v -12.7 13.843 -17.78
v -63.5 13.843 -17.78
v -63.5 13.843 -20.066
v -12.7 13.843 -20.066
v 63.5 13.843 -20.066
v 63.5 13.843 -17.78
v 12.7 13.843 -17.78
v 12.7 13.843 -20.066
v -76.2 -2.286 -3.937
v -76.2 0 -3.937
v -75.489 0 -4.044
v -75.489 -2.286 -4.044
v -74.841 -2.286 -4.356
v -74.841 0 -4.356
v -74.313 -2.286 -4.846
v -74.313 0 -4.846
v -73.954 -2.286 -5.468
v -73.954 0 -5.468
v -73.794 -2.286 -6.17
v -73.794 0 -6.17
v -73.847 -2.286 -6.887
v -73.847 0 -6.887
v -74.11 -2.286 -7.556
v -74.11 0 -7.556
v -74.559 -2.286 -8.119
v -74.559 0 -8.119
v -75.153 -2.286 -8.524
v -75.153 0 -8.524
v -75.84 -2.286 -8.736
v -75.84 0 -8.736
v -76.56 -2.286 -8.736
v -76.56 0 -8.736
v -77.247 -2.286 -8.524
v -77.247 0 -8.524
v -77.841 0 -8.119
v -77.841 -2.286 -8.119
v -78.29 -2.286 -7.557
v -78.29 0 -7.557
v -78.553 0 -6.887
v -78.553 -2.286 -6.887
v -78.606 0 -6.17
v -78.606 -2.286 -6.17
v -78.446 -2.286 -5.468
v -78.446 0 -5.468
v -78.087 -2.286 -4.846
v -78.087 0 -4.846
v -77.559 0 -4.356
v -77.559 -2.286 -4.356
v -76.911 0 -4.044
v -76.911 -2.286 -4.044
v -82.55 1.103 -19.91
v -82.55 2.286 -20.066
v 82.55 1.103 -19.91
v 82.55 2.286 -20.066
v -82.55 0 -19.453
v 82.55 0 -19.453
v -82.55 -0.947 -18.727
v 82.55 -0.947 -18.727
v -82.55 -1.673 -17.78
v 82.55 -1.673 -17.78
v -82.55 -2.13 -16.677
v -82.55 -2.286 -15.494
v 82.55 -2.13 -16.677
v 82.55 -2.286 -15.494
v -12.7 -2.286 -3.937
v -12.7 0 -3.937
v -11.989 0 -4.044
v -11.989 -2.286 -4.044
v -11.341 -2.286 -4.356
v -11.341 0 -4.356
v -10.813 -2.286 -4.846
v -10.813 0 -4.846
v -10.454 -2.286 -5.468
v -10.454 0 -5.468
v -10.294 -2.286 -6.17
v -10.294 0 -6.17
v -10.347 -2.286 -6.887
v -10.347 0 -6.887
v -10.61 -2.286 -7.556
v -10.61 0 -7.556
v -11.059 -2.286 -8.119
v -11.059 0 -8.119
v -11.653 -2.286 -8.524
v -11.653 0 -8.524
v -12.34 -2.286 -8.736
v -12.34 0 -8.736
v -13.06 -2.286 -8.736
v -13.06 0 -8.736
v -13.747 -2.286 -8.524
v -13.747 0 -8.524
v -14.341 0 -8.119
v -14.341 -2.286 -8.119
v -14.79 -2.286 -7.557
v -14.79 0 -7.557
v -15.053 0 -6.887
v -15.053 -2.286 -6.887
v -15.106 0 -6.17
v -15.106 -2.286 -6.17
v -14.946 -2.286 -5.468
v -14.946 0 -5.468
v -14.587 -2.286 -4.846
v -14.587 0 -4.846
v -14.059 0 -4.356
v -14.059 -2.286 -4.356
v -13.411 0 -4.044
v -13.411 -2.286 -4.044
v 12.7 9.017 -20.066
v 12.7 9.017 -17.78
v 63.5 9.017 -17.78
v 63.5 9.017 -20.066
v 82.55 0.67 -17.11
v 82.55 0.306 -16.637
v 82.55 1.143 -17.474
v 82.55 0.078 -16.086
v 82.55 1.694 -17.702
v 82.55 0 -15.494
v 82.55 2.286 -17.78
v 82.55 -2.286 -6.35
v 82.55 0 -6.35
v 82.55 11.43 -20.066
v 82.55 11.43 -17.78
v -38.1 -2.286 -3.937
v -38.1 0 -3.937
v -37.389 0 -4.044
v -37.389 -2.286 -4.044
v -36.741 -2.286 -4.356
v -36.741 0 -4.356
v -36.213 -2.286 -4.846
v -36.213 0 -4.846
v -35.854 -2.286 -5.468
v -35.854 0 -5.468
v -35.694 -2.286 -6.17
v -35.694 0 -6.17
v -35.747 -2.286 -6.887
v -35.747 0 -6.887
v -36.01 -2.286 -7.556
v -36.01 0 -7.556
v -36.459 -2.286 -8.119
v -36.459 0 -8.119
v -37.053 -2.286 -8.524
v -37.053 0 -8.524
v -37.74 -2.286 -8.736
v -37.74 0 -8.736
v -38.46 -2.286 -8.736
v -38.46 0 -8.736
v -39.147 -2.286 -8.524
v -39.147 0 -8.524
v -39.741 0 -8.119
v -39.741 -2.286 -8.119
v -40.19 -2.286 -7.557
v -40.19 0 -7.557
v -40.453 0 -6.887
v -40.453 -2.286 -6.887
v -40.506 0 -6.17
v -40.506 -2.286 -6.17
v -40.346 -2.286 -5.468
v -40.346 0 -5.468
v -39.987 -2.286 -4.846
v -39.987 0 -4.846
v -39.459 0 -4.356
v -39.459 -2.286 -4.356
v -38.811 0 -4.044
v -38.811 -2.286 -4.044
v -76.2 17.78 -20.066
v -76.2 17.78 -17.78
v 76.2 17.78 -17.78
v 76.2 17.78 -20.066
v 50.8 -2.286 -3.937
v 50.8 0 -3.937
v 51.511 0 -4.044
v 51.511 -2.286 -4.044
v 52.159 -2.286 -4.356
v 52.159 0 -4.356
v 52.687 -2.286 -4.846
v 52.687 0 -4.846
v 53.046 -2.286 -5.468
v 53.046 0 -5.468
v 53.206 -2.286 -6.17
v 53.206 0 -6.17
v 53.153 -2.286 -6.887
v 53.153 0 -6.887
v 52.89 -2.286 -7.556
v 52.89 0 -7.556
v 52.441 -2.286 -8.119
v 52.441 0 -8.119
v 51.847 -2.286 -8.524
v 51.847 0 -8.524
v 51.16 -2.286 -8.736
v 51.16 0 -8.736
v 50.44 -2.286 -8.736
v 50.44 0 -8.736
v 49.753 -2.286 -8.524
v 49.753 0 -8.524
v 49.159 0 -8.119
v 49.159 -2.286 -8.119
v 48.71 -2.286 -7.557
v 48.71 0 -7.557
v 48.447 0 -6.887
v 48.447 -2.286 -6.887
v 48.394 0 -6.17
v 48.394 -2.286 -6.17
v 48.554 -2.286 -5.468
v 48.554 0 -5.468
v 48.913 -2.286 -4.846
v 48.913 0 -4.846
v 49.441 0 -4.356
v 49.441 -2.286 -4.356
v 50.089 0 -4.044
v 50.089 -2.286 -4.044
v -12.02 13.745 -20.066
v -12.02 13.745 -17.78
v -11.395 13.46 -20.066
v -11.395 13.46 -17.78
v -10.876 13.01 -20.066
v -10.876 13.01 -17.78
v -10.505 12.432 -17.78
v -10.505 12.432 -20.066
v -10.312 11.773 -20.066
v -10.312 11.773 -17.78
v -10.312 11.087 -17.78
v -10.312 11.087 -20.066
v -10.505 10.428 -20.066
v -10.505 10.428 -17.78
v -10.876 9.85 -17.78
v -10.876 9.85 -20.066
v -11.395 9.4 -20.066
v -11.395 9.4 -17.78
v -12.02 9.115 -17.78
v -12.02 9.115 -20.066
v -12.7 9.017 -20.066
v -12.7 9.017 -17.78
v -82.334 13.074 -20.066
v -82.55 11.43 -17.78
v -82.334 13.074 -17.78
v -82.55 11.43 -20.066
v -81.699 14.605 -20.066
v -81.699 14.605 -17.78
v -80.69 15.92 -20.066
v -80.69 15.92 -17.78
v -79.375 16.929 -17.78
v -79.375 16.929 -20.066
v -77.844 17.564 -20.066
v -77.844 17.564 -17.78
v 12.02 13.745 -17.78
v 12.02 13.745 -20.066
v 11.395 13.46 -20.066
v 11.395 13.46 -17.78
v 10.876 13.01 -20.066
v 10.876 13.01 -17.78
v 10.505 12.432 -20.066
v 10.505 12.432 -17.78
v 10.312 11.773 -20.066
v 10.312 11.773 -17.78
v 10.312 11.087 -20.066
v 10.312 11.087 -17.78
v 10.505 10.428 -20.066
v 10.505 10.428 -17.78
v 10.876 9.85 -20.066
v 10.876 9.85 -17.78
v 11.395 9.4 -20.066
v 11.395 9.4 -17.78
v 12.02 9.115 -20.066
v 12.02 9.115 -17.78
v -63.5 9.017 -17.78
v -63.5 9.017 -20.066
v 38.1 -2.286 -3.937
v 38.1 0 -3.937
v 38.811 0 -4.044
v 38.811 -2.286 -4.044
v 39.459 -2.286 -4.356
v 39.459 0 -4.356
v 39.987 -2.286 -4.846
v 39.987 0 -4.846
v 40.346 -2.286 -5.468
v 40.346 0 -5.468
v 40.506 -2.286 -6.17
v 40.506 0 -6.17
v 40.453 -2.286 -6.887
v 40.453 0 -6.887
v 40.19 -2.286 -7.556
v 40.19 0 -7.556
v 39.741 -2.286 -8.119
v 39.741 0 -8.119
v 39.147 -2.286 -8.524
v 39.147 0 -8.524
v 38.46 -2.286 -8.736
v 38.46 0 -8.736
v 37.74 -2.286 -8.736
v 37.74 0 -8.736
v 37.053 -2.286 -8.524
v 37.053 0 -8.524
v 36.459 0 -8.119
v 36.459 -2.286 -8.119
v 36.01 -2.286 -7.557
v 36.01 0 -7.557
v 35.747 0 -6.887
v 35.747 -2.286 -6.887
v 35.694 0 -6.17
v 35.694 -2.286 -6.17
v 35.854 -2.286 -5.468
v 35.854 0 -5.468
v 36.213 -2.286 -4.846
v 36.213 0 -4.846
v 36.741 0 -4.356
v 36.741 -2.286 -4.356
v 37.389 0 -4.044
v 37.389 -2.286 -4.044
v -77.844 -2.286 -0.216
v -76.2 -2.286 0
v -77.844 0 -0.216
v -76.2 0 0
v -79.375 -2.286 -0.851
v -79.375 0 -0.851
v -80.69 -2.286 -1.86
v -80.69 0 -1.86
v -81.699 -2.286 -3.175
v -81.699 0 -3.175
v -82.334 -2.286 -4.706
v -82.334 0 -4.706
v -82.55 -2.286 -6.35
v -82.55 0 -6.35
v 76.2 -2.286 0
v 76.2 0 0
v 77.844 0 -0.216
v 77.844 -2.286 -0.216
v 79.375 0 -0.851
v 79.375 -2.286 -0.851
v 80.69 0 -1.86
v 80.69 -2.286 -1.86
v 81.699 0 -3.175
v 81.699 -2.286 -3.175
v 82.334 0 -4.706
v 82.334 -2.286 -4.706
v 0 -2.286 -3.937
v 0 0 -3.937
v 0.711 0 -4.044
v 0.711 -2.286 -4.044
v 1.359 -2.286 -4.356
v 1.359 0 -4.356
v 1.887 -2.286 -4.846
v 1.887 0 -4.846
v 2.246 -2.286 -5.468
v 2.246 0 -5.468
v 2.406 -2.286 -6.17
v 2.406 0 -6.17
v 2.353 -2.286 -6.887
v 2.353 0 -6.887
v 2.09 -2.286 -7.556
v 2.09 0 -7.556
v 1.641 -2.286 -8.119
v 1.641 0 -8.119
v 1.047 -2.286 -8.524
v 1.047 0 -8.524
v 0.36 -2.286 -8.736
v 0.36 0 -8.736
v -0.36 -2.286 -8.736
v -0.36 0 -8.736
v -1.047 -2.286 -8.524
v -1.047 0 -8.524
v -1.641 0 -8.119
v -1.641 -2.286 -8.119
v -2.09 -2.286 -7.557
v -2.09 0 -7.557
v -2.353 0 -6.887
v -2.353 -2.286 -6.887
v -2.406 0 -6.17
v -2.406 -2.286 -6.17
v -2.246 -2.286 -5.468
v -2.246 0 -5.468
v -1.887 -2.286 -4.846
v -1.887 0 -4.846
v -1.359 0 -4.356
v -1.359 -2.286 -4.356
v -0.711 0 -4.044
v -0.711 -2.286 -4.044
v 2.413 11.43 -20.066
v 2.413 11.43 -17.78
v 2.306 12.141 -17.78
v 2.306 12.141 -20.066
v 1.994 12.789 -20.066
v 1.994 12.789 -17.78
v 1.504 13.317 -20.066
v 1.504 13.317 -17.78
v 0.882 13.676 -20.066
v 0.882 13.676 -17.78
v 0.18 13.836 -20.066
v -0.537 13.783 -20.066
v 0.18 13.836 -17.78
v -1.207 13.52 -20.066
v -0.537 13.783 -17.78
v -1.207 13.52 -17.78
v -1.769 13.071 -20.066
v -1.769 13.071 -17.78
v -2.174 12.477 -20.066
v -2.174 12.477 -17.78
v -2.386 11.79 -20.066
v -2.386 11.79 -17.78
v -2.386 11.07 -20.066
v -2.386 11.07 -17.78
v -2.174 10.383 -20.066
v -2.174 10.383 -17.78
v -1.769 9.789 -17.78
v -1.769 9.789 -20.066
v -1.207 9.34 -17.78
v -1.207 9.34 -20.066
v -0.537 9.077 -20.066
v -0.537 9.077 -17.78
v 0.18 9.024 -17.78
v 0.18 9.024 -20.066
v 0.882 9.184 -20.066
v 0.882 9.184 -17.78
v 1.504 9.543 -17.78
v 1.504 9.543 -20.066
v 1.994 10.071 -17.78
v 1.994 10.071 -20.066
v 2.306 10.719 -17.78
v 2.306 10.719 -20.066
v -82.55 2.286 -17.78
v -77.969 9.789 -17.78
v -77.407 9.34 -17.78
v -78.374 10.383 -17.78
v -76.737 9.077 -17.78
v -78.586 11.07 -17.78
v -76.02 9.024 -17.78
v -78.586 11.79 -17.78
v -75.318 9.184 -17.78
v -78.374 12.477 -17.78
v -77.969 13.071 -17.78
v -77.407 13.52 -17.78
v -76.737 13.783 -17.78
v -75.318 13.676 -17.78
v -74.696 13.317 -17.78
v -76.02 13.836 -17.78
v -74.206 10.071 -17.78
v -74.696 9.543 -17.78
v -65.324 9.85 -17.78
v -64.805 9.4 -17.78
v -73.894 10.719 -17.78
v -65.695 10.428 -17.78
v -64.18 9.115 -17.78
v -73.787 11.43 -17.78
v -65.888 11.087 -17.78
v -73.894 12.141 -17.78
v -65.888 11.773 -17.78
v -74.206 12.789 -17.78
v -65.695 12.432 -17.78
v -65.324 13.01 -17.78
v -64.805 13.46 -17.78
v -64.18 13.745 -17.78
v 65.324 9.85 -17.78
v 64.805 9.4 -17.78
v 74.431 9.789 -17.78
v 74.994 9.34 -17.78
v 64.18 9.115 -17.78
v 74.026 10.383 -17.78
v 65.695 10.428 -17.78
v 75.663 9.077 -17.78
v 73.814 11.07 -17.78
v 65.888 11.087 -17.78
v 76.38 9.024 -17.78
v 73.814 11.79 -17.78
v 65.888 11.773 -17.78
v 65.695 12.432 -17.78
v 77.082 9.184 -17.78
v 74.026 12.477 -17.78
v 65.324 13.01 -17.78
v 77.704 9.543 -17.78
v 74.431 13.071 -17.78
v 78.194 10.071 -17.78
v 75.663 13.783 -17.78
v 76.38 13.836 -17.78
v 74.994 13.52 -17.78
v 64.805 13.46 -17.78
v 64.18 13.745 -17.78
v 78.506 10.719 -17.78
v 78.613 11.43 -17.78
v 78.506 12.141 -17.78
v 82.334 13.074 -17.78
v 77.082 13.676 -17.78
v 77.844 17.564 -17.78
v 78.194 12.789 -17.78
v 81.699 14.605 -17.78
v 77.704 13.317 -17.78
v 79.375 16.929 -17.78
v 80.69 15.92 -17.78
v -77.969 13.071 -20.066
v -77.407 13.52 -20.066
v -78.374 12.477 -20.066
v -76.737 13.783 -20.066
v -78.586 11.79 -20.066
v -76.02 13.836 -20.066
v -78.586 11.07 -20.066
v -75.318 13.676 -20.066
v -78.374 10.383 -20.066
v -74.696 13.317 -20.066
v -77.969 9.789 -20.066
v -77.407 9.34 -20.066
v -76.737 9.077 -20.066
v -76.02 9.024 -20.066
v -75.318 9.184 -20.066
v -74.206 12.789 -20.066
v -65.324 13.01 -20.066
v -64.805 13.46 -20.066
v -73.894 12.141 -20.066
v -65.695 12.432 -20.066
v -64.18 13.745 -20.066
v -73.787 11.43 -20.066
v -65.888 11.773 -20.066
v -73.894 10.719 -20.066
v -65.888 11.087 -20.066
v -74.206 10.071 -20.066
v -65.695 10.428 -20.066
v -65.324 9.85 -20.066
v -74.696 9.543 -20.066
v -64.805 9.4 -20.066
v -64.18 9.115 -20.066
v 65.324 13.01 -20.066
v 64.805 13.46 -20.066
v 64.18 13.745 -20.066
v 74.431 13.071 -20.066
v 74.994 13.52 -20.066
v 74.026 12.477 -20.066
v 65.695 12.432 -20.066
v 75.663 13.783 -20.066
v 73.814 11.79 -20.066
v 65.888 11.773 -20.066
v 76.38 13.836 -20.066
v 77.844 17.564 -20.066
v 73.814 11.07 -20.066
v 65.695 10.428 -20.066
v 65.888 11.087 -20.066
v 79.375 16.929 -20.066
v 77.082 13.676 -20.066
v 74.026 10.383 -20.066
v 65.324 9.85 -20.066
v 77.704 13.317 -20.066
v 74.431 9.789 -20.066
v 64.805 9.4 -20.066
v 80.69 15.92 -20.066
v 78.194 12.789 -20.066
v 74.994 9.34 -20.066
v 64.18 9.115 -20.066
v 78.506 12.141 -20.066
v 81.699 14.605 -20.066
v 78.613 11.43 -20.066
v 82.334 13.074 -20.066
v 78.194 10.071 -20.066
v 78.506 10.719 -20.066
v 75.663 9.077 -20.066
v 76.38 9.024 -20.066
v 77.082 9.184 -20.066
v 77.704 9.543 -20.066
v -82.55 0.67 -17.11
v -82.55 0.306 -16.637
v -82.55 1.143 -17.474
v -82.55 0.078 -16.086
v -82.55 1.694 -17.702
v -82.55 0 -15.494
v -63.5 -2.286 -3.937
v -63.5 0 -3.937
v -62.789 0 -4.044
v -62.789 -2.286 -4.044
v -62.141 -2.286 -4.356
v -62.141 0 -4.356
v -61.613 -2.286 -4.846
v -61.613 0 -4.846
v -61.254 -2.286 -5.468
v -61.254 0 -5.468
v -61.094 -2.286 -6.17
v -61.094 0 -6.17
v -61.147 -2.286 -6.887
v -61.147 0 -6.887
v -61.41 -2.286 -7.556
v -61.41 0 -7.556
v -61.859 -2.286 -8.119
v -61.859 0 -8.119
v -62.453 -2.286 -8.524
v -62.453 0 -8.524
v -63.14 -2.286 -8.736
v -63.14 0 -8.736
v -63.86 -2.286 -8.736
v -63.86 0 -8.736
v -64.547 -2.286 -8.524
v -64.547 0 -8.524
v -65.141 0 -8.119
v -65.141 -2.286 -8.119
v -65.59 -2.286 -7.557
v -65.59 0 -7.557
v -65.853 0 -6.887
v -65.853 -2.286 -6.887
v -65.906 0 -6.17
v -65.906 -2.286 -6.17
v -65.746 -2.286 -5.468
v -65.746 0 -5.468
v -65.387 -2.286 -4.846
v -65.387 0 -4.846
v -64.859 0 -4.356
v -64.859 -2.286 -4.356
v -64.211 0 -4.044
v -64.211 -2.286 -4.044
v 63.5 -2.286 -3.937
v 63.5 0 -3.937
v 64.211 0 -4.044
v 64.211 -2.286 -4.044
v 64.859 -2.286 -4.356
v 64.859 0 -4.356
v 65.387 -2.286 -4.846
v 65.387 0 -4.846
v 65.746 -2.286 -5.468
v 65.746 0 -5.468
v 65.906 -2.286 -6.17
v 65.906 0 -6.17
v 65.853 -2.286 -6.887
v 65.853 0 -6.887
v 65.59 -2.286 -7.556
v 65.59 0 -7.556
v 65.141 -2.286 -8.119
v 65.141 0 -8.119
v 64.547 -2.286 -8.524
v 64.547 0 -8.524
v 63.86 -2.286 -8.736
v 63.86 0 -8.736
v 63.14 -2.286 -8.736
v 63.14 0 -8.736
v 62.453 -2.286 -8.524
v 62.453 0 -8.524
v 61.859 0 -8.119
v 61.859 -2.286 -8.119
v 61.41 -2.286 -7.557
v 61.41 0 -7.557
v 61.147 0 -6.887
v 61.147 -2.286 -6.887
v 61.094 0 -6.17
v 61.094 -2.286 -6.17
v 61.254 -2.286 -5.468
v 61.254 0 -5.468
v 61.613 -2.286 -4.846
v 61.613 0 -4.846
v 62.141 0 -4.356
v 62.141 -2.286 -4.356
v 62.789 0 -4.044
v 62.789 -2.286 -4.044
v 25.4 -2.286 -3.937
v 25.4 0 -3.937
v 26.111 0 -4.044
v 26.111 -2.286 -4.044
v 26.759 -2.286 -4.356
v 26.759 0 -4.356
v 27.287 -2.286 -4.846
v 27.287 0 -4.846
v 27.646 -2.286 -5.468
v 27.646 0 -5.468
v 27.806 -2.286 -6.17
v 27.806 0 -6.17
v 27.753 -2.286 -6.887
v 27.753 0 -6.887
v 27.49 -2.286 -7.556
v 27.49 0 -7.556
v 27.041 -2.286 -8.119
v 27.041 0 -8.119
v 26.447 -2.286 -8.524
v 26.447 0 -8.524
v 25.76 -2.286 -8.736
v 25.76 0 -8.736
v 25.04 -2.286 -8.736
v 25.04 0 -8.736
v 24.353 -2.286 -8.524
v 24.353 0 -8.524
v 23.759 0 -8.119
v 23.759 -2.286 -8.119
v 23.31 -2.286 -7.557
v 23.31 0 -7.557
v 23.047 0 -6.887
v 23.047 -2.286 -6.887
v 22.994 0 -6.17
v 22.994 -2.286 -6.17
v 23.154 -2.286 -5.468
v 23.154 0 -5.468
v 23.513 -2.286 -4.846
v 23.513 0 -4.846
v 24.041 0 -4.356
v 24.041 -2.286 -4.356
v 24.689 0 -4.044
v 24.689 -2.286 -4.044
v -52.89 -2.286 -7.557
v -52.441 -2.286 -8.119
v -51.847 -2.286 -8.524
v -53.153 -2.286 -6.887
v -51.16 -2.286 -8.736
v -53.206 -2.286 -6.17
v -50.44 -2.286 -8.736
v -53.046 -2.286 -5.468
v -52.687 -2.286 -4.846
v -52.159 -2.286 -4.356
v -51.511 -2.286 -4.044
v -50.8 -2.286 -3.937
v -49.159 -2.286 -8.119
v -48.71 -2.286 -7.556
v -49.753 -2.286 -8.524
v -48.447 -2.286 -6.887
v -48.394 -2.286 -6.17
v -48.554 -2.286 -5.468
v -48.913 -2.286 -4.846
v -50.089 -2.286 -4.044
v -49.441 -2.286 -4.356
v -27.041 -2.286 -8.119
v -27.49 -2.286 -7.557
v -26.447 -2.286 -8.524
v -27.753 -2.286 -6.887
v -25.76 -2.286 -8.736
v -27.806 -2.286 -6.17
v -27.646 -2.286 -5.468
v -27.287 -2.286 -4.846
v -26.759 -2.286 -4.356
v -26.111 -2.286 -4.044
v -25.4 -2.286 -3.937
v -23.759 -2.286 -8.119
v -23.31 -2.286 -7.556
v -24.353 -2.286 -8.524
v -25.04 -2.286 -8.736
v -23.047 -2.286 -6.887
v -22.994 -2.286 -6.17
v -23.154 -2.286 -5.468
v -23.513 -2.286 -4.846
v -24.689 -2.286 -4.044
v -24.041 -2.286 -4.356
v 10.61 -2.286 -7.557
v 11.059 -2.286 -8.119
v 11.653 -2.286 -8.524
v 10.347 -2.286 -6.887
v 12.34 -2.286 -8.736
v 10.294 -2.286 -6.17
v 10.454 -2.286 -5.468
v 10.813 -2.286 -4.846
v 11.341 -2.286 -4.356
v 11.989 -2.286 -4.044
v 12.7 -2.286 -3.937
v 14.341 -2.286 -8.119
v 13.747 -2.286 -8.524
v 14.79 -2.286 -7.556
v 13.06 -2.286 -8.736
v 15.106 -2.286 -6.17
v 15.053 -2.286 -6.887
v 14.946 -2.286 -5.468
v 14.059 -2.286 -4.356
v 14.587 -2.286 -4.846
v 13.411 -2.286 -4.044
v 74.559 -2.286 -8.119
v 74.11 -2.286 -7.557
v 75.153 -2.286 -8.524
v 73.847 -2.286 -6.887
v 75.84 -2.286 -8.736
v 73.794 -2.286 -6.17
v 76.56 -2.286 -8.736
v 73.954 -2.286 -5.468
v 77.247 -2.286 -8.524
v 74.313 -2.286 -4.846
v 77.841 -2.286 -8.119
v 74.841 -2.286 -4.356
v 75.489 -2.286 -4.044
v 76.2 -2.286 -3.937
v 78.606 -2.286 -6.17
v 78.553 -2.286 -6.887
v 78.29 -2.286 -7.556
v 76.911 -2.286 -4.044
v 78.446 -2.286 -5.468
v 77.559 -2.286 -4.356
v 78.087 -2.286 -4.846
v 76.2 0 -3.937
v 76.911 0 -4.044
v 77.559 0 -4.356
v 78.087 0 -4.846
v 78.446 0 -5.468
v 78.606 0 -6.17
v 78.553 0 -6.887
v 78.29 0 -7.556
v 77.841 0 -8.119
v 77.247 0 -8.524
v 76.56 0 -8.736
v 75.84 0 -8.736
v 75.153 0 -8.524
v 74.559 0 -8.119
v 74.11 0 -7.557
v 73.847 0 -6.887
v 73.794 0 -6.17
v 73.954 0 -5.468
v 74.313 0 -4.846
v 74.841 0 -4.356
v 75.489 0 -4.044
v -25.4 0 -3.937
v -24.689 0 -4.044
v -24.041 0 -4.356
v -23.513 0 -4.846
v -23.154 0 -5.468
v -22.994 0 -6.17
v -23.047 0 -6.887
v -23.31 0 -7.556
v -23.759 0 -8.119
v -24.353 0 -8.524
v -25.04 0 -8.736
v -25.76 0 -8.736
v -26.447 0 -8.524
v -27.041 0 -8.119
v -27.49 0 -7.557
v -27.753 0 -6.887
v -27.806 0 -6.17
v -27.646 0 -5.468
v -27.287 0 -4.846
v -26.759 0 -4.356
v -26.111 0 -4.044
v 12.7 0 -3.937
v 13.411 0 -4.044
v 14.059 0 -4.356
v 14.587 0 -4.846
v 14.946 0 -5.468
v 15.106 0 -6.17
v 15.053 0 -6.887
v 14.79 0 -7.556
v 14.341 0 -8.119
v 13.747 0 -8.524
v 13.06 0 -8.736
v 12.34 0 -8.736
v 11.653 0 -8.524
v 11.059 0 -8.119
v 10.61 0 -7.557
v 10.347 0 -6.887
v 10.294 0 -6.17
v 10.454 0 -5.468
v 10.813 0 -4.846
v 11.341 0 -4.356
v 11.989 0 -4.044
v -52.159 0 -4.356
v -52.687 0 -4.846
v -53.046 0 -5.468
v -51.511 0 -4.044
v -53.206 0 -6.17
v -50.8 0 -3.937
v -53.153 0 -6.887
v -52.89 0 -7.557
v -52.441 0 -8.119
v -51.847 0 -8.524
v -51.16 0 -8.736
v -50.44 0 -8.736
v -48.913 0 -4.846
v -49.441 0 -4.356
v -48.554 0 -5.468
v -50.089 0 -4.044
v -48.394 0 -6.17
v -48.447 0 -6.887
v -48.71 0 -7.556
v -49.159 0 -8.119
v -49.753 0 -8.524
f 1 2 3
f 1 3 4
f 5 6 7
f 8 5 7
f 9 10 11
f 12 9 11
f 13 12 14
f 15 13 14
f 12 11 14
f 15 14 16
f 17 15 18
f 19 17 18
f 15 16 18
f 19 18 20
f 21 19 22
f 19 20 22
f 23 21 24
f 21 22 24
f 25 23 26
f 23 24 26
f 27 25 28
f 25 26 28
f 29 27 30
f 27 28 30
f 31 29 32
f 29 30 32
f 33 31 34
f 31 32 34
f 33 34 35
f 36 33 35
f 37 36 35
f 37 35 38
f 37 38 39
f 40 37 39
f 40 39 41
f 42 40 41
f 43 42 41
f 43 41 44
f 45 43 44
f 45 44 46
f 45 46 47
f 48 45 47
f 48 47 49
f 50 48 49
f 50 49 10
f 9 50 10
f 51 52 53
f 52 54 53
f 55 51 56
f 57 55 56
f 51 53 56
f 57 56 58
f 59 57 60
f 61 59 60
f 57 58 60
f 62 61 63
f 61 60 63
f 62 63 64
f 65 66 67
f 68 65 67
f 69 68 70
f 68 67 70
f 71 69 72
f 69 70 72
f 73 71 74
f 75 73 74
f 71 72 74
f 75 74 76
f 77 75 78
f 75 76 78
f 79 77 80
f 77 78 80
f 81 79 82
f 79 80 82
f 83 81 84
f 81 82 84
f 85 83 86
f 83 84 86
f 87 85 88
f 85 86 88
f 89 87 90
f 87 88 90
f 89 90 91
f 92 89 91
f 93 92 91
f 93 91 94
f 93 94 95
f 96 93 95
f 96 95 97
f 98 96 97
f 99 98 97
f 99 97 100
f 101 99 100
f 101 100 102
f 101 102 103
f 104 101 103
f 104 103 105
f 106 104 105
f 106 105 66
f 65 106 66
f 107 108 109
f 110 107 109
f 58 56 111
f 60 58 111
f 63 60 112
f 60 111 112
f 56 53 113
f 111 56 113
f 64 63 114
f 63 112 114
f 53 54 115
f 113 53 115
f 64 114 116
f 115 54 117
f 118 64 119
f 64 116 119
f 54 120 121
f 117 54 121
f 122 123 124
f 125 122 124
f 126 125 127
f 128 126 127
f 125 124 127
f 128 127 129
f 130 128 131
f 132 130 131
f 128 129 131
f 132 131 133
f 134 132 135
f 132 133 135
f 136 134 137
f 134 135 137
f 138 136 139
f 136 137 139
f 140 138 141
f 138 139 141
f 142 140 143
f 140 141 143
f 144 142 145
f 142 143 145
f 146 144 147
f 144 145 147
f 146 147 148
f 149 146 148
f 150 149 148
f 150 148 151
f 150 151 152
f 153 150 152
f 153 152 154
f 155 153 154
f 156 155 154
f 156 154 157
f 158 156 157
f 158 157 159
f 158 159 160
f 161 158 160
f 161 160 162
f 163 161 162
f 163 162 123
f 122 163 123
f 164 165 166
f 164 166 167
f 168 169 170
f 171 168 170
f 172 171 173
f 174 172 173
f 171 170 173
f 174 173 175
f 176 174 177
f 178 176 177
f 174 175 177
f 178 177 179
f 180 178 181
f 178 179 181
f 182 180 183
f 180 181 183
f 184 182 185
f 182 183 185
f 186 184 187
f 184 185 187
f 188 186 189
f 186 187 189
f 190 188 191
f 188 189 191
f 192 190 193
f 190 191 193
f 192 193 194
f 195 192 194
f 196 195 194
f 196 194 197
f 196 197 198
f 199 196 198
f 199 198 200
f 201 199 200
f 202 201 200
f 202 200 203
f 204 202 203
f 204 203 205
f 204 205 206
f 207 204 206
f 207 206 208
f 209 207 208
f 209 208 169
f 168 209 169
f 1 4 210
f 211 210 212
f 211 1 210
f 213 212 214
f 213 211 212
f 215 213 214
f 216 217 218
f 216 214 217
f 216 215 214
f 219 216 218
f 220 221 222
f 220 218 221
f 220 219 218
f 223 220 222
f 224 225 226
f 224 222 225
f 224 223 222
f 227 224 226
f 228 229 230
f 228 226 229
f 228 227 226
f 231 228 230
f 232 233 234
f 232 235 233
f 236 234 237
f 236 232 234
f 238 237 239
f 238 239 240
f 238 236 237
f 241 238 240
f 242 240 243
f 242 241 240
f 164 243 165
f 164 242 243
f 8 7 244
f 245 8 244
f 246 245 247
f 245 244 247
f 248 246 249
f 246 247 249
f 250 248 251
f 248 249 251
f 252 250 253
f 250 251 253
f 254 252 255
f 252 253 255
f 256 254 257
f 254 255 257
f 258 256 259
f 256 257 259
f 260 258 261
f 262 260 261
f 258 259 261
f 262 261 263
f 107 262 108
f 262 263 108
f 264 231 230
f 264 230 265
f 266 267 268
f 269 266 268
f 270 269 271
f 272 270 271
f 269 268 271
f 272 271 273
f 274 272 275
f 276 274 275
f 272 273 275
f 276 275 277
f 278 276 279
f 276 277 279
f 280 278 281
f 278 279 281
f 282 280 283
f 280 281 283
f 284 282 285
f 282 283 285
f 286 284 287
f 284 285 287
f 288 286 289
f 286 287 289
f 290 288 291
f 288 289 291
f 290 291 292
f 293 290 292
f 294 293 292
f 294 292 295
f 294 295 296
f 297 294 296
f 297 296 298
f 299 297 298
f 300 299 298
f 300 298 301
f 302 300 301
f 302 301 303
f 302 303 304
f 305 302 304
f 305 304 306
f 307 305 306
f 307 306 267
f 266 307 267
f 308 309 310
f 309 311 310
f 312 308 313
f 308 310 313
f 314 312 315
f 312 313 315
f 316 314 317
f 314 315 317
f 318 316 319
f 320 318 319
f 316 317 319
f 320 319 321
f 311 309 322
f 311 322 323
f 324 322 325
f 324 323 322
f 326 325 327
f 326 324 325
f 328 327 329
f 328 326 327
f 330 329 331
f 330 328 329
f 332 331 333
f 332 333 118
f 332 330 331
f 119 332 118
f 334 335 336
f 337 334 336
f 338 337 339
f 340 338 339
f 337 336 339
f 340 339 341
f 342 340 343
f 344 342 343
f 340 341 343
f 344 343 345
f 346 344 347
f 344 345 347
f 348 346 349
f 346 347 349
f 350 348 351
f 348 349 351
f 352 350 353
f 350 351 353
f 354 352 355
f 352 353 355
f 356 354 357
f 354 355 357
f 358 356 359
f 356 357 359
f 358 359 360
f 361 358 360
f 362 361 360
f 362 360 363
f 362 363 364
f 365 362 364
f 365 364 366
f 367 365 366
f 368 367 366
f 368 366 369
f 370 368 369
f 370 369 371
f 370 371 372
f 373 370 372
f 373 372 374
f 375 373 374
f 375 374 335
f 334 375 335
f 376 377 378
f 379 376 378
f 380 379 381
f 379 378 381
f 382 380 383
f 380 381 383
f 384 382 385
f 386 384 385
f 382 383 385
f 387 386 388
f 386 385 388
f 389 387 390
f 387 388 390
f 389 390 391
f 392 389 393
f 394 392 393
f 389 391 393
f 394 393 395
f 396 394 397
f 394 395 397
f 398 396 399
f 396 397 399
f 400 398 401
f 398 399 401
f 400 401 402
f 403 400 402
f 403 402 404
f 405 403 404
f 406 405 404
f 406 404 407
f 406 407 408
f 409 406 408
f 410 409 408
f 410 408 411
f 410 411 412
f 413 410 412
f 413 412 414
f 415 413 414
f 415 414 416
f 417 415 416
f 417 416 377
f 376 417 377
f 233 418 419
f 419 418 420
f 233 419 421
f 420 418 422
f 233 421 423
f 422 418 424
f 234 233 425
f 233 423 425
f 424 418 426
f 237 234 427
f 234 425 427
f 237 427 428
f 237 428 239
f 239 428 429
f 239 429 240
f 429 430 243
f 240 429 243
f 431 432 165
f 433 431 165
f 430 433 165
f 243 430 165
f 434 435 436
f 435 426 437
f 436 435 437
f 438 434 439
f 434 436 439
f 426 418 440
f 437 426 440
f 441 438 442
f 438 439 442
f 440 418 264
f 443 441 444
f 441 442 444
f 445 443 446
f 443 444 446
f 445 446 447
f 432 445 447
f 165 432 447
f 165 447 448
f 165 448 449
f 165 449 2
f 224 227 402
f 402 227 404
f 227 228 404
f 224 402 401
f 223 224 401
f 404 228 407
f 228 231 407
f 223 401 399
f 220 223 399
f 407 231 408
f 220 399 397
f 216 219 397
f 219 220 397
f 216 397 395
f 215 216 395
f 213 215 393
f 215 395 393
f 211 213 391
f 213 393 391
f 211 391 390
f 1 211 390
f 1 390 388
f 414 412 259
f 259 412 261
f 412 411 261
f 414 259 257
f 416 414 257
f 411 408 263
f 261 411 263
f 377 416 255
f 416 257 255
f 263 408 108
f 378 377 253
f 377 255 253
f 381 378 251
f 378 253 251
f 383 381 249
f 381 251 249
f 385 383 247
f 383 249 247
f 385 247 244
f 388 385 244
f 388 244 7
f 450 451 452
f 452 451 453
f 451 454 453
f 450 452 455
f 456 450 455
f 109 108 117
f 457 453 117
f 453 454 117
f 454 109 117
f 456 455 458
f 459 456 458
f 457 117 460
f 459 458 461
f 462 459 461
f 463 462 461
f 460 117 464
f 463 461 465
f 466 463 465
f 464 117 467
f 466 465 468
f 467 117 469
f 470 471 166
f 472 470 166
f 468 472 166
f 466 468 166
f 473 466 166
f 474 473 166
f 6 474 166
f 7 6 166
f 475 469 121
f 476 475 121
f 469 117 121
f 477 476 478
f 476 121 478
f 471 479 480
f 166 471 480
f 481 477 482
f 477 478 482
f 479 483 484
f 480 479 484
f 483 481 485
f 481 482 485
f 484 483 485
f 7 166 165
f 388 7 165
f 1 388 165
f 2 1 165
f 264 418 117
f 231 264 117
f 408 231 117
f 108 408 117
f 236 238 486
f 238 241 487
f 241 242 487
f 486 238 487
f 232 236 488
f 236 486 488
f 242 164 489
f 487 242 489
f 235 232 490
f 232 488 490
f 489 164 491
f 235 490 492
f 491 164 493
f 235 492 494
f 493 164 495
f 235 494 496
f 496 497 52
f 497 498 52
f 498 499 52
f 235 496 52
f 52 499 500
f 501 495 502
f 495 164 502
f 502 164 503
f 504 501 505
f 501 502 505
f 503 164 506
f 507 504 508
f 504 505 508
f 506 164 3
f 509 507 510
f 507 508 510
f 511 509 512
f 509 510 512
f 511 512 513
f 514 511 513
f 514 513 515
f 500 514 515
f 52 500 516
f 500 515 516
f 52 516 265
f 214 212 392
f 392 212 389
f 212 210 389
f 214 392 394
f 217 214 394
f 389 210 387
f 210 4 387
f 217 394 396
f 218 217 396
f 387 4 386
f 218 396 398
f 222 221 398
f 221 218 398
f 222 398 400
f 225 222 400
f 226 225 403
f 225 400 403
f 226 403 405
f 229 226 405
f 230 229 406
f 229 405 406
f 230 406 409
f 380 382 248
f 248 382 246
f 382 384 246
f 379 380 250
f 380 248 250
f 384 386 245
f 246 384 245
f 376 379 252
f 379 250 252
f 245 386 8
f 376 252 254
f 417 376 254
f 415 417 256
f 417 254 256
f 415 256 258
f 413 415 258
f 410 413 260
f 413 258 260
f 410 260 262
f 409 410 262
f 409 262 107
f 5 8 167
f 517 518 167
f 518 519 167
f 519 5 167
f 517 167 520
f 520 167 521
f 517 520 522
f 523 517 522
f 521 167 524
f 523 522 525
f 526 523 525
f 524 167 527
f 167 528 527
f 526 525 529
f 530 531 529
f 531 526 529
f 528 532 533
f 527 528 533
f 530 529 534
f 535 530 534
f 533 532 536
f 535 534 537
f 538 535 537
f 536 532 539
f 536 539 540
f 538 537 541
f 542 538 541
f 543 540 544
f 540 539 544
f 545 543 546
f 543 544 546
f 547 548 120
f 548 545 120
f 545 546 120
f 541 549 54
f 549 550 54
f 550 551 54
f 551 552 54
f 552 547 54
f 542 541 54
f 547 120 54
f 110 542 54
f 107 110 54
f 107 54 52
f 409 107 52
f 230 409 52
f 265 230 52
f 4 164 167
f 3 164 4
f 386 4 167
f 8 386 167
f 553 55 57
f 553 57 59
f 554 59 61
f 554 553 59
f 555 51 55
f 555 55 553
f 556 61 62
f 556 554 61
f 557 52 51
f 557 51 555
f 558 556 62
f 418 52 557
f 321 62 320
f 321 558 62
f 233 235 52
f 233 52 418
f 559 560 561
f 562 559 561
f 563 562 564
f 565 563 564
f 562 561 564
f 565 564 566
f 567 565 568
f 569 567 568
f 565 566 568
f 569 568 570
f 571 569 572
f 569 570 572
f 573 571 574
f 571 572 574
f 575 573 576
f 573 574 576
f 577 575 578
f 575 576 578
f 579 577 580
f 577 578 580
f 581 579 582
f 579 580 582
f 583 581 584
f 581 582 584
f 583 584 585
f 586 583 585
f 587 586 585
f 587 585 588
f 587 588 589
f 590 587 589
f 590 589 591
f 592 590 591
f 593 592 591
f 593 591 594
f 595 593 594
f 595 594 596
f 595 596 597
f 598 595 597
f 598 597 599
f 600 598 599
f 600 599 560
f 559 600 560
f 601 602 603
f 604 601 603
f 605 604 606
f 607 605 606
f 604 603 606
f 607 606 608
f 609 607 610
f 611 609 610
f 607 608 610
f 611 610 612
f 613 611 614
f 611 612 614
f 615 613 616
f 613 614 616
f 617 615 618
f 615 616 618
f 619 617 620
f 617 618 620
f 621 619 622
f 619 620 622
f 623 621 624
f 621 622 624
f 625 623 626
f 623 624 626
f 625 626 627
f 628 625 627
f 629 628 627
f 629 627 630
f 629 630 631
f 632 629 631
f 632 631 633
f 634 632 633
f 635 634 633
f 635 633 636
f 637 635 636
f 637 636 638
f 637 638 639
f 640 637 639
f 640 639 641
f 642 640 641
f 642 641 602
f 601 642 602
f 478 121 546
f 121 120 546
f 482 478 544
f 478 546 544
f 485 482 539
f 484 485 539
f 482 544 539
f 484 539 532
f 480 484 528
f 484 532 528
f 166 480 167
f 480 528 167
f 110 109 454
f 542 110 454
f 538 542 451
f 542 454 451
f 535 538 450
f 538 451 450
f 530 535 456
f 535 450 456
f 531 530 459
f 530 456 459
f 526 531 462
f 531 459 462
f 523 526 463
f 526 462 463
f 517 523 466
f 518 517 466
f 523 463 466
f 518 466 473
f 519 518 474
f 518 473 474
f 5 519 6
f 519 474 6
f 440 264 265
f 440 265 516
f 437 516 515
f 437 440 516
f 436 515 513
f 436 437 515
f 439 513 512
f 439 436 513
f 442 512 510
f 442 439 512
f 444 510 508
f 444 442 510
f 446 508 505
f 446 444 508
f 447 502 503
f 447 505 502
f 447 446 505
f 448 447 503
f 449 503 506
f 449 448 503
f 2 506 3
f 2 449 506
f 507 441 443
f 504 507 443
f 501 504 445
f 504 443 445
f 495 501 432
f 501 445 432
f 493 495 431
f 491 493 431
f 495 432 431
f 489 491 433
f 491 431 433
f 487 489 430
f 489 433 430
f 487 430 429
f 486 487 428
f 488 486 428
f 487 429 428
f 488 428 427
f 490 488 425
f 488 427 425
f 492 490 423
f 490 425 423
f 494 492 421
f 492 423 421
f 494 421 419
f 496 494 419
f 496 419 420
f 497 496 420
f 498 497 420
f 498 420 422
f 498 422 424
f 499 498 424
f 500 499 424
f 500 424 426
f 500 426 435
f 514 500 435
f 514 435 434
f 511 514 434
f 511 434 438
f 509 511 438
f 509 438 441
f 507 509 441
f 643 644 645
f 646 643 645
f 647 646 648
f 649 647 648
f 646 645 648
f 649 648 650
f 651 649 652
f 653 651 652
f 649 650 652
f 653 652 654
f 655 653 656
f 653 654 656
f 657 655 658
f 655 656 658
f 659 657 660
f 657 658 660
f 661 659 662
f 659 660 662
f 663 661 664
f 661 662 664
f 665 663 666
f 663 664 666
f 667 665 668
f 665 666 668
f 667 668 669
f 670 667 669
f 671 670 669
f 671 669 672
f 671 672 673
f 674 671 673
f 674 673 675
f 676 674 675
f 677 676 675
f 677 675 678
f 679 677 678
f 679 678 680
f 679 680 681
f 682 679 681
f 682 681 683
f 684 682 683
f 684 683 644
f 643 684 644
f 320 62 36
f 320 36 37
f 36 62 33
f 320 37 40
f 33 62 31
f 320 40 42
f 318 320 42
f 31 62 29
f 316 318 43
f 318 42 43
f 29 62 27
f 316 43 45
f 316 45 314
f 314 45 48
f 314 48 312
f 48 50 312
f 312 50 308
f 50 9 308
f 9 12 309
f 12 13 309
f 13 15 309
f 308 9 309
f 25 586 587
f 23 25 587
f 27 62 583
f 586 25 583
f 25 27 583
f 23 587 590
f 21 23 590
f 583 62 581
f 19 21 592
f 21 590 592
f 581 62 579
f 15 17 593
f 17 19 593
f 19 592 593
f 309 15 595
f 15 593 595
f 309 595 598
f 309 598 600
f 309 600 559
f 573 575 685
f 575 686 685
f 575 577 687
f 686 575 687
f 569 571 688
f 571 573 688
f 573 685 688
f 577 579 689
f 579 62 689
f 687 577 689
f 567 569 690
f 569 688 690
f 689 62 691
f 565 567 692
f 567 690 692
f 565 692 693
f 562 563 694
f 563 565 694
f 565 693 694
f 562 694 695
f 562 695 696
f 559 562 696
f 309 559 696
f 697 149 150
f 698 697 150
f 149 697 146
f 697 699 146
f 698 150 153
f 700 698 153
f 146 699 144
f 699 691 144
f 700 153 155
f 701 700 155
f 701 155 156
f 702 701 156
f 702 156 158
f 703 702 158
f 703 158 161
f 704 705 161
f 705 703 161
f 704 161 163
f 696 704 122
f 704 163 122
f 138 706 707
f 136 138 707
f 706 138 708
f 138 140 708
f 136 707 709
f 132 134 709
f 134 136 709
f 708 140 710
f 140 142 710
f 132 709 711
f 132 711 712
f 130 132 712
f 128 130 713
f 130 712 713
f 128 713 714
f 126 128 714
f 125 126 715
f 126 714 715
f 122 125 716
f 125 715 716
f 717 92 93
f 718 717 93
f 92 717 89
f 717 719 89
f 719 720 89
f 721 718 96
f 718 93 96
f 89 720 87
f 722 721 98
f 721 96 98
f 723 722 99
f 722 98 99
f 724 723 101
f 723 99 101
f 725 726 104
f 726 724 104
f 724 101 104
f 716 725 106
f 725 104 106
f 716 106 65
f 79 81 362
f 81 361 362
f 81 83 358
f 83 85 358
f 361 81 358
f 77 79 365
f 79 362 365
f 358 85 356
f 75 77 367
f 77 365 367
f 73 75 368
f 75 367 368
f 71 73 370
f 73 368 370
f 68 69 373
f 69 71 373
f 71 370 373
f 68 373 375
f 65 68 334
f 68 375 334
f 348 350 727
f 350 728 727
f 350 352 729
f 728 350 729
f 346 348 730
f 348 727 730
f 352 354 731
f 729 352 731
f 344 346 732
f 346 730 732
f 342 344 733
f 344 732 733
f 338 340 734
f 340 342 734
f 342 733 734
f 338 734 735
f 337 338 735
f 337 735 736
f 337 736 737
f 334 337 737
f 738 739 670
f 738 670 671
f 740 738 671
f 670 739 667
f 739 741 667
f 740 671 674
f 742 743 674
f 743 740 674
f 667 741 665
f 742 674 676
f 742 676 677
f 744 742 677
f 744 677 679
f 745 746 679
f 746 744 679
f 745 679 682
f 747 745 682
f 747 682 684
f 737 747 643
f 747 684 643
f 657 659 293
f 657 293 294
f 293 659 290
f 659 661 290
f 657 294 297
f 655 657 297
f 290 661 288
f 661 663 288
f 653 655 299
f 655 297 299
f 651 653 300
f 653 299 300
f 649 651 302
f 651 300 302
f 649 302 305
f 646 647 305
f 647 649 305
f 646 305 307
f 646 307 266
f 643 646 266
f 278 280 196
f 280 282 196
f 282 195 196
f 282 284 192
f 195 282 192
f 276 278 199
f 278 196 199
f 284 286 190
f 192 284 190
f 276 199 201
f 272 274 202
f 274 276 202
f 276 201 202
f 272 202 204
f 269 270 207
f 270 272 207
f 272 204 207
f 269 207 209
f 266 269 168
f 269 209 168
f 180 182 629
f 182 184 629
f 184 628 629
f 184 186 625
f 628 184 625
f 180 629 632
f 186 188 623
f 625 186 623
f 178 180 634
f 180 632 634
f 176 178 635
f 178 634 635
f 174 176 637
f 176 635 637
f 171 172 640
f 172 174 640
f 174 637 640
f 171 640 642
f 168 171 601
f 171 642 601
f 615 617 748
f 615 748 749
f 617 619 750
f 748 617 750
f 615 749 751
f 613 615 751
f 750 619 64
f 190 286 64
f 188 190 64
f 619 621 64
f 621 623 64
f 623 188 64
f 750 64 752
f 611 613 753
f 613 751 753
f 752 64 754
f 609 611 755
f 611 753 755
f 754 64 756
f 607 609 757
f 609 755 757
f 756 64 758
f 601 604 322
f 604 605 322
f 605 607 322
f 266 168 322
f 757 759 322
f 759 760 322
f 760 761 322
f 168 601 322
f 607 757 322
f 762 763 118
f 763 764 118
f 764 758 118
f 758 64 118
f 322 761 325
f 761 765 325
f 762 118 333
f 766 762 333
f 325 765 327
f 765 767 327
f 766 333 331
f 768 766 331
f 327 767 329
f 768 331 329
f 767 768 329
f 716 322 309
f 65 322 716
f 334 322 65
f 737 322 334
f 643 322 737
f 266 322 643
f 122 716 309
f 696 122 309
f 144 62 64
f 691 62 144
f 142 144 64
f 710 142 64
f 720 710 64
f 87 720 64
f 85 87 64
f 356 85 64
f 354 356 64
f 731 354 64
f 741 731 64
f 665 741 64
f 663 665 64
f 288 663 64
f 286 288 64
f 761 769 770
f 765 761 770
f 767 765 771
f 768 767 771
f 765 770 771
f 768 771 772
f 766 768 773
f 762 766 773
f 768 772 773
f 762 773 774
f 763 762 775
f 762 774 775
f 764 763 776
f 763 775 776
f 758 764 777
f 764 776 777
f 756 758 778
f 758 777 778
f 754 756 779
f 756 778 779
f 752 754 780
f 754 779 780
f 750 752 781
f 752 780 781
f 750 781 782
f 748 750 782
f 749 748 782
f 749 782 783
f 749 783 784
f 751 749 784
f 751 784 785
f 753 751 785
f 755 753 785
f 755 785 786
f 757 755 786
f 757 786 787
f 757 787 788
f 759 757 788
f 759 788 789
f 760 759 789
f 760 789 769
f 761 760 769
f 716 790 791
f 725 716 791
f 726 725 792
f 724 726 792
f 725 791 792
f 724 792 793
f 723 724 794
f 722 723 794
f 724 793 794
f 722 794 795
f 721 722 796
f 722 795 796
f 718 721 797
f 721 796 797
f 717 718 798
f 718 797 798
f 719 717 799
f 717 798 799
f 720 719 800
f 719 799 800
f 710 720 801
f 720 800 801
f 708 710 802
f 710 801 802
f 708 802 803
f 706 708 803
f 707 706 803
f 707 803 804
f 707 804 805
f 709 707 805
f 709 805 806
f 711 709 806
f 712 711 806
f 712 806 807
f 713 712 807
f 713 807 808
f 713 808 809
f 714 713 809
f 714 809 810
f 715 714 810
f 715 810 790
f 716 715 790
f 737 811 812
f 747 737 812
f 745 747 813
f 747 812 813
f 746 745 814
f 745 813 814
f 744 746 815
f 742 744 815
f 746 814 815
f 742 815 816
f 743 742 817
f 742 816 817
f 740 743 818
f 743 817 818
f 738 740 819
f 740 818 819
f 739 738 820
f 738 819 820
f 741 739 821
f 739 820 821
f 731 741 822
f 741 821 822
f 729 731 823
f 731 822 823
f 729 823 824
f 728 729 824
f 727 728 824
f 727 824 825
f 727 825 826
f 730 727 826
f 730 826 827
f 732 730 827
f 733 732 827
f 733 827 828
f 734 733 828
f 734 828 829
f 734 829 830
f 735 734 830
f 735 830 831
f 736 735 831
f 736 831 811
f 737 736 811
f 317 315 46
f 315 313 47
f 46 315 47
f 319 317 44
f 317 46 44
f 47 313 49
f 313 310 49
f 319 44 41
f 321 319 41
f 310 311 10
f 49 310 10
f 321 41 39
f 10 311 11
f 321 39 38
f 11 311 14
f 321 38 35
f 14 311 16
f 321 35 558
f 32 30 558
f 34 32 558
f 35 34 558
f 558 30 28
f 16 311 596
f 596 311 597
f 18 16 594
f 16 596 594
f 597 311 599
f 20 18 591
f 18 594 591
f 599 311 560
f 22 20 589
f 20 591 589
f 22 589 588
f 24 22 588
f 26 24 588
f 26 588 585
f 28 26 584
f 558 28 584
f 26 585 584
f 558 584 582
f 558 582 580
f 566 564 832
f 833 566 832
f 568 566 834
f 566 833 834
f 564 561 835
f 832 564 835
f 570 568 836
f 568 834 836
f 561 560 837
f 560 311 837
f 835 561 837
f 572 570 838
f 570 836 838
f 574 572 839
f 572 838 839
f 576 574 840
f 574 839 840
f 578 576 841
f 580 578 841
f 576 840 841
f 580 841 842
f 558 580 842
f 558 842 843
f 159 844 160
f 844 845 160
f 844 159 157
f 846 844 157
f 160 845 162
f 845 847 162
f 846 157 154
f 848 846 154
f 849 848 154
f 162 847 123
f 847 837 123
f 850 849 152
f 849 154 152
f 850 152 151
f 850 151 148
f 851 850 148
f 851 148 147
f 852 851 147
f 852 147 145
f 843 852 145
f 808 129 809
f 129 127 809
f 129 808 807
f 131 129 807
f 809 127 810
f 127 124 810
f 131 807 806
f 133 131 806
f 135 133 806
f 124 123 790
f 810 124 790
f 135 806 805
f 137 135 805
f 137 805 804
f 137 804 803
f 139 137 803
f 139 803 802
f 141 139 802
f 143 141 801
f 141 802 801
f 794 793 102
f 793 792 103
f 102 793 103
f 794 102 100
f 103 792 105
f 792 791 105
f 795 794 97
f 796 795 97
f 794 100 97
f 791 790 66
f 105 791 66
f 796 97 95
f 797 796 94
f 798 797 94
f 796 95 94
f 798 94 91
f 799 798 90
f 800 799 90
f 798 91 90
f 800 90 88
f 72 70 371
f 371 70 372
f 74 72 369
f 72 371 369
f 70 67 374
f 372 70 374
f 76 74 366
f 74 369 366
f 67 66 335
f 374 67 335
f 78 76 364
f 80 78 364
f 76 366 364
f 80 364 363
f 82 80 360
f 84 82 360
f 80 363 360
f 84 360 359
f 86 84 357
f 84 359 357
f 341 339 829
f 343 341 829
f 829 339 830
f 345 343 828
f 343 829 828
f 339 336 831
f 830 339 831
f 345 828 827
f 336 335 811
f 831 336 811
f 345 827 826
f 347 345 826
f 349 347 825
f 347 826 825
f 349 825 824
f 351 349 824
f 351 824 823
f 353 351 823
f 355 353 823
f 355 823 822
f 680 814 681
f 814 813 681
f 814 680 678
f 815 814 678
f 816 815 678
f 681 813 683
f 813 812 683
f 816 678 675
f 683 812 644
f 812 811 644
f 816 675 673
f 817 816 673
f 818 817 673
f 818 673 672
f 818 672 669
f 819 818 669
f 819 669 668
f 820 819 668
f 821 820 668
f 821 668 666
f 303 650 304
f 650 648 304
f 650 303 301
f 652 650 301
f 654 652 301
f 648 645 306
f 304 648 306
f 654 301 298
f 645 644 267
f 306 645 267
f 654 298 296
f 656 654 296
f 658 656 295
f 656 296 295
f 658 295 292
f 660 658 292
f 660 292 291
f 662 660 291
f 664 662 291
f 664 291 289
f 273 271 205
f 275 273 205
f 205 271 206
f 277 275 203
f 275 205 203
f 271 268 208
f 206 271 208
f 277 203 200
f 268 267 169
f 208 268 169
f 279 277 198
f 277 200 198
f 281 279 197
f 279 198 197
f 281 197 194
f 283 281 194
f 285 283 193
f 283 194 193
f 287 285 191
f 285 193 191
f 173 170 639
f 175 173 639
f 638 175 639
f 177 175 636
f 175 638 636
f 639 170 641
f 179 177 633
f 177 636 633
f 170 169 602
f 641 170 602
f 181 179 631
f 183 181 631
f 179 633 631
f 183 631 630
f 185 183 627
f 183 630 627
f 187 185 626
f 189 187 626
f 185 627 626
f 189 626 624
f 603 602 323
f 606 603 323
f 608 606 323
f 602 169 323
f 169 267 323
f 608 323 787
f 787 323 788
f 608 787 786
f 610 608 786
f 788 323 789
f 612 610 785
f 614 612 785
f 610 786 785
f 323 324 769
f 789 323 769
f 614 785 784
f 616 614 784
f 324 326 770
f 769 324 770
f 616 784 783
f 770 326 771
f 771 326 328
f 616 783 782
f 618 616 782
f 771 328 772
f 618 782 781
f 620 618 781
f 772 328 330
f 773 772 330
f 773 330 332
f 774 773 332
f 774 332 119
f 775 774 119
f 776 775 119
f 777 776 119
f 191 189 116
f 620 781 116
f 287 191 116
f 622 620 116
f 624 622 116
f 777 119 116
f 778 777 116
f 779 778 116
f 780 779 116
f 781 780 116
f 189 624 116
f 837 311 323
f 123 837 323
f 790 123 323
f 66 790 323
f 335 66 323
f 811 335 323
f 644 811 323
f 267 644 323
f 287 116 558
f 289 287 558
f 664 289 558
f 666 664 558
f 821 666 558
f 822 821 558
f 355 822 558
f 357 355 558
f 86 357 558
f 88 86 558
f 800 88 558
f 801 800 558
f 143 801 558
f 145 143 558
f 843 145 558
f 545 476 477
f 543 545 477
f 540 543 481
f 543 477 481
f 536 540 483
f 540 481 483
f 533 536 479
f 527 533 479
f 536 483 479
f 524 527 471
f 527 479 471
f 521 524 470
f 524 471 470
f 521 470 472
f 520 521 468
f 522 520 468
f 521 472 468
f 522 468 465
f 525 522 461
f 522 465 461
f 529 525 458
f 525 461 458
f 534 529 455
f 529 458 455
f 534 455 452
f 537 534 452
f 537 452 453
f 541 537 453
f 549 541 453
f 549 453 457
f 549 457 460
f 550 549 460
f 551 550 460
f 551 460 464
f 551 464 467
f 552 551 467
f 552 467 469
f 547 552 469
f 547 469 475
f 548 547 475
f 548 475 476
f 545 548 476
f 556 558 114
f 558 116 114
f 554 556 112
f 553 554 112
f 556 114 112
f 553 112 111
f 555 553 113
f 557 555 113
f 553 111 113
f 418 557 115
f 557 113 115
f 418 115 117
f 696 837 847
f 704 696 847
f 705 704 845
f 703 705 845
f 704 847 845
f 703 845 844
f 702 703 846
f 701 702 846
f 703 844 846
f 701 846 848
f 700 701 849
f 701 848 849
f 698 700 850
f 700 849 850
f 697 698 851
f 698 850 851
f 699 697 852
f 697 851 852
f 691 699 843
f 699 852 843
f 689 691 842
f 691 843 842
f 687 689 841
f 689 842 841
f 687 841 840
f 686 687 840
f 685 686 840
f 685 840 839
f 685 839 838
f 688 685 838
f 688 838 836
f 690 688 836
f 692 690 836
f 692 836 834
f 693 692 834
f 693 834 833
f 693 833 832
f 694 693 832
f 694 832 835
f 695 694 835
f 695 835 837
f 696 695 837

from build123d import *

# Parameters (mm, degrees)
EXTRUDE_THIN1_DEPTH = 82.55
SKETCH2_R           = 2.413
EXTRUDE2_DEPTH      = 87.794442541
LPATTERN1_COUNT     = 13
LPATTERN1_PITCH     = 12.7
FILLET1_R           = 6.35
SKETCH3_R           = 2.413
EXTRUDE3_DEPTH      = 87.294607595
LPATTERN2_COUNT     = 13
LPATTERN2_PITCH     = 76.2
EXTRUDE4_DEPTH      = 87.294607595


with BuildPart() as part:
    # Sketch1 → Extrude-Thin1 (new, symmetric)
    with BuildSketch(Plane(origin=(0, 0, 0), x_dir=(0, 0, -1), z_dir=(1, 0, 0))):
        with BuildLine():
            Line((0, 0), (15.494, 0))
            ThreePointArc((15.494, 0), (17.110446102, 0.669553898), (17.78, 2.286))
            Line((17.78, 2.286), (17.78, 17.78))
            Line((17.78, 17.78), (20.066, 17.78))
            Line((20.066, 17.78), (20.066, 2.286))
            ThreePointArc((20.066, 2.286), (18.726892204, -0.946892204), (15.494, -2.286))
            Line((15.494, -2.286), (0, -2.286))
            Line((0, -2.286), (0, 0))
        make_face()
    extrude(amount=EXTRUDE_THIN1_DEPTH, both=True)

    # Sketch2 → Extrude2 (cut, through all)
    with BuildSketch(Plane(origin=(0, 0, 0), x_dir=(-1, 0, 0), z_dir=(0, 1, 0))):
        with Locations(Location((76.2, -6.35, 0), (0, 0, 90))):
            Circle(SKETCH2_R)
    extrude2 = extrude(amount=-EXTRUDE2_DEPTH, mode=Mode.SUBTRACT)

    # LPattern1: Extrude2 ×13
    with Locations(*[(i * LPATTERN1_PITCH, 0, 0) for i in range(1, LPATTERN1_COUNT)]):
        add(extrude2, mode=Mode.SUBTRACT)

    # Fillet1
    fillet1_edges = [part.edges().sort_by_distance(p)[0] for p in [
        (82.55, -1.143, 0),
        (-82.55, -1.143, 0),
        (82.55, 17.78, -18.923),
        (-82.55, 17.78, -18.923),
    ]]
    fillet(fillet1_edges, radius=FILLET1_R)

    # Sketch3 → Extrude3 (cut, through all)
    with BuildSketch(Plane.XY.offset(-17.78)):
        with Locations((-76.2, 11.43)):
            Circle(SKETCH3_R)
    extrude3 = extrude(amount=-EXTRUDE3_DEPTH, mode=Mode.SUBTRACT)

    # LPattern2: Extrude3 ×13
    with Locations(*[(i * LPATTERN2_PITCH, 0, 0) for i in range(1, LPATTERN2_COUNT)]):
        add(extrude3, mode=Mode.SUBTRACT)

    # Sketch4 → Extrude4 (cut, through all)
    with BuildSketch(Plane.XY.offset(-17.78)):
        with BuildLine():
            Line((-63.5, 13.843), (-12.7, 13.843))
            ThreePointArc((-12.7, 13.843), (-10.287, 11.43), (-12.7, 9.017))
            Line((-12.7, 9.017), (-63.5, 9.017))
            ThreePointArc((-63.5, 9.017), (-65.913, 11.43), (-63.5, 13.843))
        make_face()
        with BuildLine():
            Line((63.5, 13.843), (12.7, 13.843))
            ThreePointArc((12.7, 13.843), (10.287, 11.43), (12.7, 9.017))
            Line((12.7, 9.017), (63.5, 9.017))
            ThreePointArc((63.5, 9.017), (65.913, 11.43), (63.5, 13.843))
        make_face()
    extrude(amount=-EXTRUDE4_DEPTH, mode=Mode.SUBTRACT)


solid = part.part
